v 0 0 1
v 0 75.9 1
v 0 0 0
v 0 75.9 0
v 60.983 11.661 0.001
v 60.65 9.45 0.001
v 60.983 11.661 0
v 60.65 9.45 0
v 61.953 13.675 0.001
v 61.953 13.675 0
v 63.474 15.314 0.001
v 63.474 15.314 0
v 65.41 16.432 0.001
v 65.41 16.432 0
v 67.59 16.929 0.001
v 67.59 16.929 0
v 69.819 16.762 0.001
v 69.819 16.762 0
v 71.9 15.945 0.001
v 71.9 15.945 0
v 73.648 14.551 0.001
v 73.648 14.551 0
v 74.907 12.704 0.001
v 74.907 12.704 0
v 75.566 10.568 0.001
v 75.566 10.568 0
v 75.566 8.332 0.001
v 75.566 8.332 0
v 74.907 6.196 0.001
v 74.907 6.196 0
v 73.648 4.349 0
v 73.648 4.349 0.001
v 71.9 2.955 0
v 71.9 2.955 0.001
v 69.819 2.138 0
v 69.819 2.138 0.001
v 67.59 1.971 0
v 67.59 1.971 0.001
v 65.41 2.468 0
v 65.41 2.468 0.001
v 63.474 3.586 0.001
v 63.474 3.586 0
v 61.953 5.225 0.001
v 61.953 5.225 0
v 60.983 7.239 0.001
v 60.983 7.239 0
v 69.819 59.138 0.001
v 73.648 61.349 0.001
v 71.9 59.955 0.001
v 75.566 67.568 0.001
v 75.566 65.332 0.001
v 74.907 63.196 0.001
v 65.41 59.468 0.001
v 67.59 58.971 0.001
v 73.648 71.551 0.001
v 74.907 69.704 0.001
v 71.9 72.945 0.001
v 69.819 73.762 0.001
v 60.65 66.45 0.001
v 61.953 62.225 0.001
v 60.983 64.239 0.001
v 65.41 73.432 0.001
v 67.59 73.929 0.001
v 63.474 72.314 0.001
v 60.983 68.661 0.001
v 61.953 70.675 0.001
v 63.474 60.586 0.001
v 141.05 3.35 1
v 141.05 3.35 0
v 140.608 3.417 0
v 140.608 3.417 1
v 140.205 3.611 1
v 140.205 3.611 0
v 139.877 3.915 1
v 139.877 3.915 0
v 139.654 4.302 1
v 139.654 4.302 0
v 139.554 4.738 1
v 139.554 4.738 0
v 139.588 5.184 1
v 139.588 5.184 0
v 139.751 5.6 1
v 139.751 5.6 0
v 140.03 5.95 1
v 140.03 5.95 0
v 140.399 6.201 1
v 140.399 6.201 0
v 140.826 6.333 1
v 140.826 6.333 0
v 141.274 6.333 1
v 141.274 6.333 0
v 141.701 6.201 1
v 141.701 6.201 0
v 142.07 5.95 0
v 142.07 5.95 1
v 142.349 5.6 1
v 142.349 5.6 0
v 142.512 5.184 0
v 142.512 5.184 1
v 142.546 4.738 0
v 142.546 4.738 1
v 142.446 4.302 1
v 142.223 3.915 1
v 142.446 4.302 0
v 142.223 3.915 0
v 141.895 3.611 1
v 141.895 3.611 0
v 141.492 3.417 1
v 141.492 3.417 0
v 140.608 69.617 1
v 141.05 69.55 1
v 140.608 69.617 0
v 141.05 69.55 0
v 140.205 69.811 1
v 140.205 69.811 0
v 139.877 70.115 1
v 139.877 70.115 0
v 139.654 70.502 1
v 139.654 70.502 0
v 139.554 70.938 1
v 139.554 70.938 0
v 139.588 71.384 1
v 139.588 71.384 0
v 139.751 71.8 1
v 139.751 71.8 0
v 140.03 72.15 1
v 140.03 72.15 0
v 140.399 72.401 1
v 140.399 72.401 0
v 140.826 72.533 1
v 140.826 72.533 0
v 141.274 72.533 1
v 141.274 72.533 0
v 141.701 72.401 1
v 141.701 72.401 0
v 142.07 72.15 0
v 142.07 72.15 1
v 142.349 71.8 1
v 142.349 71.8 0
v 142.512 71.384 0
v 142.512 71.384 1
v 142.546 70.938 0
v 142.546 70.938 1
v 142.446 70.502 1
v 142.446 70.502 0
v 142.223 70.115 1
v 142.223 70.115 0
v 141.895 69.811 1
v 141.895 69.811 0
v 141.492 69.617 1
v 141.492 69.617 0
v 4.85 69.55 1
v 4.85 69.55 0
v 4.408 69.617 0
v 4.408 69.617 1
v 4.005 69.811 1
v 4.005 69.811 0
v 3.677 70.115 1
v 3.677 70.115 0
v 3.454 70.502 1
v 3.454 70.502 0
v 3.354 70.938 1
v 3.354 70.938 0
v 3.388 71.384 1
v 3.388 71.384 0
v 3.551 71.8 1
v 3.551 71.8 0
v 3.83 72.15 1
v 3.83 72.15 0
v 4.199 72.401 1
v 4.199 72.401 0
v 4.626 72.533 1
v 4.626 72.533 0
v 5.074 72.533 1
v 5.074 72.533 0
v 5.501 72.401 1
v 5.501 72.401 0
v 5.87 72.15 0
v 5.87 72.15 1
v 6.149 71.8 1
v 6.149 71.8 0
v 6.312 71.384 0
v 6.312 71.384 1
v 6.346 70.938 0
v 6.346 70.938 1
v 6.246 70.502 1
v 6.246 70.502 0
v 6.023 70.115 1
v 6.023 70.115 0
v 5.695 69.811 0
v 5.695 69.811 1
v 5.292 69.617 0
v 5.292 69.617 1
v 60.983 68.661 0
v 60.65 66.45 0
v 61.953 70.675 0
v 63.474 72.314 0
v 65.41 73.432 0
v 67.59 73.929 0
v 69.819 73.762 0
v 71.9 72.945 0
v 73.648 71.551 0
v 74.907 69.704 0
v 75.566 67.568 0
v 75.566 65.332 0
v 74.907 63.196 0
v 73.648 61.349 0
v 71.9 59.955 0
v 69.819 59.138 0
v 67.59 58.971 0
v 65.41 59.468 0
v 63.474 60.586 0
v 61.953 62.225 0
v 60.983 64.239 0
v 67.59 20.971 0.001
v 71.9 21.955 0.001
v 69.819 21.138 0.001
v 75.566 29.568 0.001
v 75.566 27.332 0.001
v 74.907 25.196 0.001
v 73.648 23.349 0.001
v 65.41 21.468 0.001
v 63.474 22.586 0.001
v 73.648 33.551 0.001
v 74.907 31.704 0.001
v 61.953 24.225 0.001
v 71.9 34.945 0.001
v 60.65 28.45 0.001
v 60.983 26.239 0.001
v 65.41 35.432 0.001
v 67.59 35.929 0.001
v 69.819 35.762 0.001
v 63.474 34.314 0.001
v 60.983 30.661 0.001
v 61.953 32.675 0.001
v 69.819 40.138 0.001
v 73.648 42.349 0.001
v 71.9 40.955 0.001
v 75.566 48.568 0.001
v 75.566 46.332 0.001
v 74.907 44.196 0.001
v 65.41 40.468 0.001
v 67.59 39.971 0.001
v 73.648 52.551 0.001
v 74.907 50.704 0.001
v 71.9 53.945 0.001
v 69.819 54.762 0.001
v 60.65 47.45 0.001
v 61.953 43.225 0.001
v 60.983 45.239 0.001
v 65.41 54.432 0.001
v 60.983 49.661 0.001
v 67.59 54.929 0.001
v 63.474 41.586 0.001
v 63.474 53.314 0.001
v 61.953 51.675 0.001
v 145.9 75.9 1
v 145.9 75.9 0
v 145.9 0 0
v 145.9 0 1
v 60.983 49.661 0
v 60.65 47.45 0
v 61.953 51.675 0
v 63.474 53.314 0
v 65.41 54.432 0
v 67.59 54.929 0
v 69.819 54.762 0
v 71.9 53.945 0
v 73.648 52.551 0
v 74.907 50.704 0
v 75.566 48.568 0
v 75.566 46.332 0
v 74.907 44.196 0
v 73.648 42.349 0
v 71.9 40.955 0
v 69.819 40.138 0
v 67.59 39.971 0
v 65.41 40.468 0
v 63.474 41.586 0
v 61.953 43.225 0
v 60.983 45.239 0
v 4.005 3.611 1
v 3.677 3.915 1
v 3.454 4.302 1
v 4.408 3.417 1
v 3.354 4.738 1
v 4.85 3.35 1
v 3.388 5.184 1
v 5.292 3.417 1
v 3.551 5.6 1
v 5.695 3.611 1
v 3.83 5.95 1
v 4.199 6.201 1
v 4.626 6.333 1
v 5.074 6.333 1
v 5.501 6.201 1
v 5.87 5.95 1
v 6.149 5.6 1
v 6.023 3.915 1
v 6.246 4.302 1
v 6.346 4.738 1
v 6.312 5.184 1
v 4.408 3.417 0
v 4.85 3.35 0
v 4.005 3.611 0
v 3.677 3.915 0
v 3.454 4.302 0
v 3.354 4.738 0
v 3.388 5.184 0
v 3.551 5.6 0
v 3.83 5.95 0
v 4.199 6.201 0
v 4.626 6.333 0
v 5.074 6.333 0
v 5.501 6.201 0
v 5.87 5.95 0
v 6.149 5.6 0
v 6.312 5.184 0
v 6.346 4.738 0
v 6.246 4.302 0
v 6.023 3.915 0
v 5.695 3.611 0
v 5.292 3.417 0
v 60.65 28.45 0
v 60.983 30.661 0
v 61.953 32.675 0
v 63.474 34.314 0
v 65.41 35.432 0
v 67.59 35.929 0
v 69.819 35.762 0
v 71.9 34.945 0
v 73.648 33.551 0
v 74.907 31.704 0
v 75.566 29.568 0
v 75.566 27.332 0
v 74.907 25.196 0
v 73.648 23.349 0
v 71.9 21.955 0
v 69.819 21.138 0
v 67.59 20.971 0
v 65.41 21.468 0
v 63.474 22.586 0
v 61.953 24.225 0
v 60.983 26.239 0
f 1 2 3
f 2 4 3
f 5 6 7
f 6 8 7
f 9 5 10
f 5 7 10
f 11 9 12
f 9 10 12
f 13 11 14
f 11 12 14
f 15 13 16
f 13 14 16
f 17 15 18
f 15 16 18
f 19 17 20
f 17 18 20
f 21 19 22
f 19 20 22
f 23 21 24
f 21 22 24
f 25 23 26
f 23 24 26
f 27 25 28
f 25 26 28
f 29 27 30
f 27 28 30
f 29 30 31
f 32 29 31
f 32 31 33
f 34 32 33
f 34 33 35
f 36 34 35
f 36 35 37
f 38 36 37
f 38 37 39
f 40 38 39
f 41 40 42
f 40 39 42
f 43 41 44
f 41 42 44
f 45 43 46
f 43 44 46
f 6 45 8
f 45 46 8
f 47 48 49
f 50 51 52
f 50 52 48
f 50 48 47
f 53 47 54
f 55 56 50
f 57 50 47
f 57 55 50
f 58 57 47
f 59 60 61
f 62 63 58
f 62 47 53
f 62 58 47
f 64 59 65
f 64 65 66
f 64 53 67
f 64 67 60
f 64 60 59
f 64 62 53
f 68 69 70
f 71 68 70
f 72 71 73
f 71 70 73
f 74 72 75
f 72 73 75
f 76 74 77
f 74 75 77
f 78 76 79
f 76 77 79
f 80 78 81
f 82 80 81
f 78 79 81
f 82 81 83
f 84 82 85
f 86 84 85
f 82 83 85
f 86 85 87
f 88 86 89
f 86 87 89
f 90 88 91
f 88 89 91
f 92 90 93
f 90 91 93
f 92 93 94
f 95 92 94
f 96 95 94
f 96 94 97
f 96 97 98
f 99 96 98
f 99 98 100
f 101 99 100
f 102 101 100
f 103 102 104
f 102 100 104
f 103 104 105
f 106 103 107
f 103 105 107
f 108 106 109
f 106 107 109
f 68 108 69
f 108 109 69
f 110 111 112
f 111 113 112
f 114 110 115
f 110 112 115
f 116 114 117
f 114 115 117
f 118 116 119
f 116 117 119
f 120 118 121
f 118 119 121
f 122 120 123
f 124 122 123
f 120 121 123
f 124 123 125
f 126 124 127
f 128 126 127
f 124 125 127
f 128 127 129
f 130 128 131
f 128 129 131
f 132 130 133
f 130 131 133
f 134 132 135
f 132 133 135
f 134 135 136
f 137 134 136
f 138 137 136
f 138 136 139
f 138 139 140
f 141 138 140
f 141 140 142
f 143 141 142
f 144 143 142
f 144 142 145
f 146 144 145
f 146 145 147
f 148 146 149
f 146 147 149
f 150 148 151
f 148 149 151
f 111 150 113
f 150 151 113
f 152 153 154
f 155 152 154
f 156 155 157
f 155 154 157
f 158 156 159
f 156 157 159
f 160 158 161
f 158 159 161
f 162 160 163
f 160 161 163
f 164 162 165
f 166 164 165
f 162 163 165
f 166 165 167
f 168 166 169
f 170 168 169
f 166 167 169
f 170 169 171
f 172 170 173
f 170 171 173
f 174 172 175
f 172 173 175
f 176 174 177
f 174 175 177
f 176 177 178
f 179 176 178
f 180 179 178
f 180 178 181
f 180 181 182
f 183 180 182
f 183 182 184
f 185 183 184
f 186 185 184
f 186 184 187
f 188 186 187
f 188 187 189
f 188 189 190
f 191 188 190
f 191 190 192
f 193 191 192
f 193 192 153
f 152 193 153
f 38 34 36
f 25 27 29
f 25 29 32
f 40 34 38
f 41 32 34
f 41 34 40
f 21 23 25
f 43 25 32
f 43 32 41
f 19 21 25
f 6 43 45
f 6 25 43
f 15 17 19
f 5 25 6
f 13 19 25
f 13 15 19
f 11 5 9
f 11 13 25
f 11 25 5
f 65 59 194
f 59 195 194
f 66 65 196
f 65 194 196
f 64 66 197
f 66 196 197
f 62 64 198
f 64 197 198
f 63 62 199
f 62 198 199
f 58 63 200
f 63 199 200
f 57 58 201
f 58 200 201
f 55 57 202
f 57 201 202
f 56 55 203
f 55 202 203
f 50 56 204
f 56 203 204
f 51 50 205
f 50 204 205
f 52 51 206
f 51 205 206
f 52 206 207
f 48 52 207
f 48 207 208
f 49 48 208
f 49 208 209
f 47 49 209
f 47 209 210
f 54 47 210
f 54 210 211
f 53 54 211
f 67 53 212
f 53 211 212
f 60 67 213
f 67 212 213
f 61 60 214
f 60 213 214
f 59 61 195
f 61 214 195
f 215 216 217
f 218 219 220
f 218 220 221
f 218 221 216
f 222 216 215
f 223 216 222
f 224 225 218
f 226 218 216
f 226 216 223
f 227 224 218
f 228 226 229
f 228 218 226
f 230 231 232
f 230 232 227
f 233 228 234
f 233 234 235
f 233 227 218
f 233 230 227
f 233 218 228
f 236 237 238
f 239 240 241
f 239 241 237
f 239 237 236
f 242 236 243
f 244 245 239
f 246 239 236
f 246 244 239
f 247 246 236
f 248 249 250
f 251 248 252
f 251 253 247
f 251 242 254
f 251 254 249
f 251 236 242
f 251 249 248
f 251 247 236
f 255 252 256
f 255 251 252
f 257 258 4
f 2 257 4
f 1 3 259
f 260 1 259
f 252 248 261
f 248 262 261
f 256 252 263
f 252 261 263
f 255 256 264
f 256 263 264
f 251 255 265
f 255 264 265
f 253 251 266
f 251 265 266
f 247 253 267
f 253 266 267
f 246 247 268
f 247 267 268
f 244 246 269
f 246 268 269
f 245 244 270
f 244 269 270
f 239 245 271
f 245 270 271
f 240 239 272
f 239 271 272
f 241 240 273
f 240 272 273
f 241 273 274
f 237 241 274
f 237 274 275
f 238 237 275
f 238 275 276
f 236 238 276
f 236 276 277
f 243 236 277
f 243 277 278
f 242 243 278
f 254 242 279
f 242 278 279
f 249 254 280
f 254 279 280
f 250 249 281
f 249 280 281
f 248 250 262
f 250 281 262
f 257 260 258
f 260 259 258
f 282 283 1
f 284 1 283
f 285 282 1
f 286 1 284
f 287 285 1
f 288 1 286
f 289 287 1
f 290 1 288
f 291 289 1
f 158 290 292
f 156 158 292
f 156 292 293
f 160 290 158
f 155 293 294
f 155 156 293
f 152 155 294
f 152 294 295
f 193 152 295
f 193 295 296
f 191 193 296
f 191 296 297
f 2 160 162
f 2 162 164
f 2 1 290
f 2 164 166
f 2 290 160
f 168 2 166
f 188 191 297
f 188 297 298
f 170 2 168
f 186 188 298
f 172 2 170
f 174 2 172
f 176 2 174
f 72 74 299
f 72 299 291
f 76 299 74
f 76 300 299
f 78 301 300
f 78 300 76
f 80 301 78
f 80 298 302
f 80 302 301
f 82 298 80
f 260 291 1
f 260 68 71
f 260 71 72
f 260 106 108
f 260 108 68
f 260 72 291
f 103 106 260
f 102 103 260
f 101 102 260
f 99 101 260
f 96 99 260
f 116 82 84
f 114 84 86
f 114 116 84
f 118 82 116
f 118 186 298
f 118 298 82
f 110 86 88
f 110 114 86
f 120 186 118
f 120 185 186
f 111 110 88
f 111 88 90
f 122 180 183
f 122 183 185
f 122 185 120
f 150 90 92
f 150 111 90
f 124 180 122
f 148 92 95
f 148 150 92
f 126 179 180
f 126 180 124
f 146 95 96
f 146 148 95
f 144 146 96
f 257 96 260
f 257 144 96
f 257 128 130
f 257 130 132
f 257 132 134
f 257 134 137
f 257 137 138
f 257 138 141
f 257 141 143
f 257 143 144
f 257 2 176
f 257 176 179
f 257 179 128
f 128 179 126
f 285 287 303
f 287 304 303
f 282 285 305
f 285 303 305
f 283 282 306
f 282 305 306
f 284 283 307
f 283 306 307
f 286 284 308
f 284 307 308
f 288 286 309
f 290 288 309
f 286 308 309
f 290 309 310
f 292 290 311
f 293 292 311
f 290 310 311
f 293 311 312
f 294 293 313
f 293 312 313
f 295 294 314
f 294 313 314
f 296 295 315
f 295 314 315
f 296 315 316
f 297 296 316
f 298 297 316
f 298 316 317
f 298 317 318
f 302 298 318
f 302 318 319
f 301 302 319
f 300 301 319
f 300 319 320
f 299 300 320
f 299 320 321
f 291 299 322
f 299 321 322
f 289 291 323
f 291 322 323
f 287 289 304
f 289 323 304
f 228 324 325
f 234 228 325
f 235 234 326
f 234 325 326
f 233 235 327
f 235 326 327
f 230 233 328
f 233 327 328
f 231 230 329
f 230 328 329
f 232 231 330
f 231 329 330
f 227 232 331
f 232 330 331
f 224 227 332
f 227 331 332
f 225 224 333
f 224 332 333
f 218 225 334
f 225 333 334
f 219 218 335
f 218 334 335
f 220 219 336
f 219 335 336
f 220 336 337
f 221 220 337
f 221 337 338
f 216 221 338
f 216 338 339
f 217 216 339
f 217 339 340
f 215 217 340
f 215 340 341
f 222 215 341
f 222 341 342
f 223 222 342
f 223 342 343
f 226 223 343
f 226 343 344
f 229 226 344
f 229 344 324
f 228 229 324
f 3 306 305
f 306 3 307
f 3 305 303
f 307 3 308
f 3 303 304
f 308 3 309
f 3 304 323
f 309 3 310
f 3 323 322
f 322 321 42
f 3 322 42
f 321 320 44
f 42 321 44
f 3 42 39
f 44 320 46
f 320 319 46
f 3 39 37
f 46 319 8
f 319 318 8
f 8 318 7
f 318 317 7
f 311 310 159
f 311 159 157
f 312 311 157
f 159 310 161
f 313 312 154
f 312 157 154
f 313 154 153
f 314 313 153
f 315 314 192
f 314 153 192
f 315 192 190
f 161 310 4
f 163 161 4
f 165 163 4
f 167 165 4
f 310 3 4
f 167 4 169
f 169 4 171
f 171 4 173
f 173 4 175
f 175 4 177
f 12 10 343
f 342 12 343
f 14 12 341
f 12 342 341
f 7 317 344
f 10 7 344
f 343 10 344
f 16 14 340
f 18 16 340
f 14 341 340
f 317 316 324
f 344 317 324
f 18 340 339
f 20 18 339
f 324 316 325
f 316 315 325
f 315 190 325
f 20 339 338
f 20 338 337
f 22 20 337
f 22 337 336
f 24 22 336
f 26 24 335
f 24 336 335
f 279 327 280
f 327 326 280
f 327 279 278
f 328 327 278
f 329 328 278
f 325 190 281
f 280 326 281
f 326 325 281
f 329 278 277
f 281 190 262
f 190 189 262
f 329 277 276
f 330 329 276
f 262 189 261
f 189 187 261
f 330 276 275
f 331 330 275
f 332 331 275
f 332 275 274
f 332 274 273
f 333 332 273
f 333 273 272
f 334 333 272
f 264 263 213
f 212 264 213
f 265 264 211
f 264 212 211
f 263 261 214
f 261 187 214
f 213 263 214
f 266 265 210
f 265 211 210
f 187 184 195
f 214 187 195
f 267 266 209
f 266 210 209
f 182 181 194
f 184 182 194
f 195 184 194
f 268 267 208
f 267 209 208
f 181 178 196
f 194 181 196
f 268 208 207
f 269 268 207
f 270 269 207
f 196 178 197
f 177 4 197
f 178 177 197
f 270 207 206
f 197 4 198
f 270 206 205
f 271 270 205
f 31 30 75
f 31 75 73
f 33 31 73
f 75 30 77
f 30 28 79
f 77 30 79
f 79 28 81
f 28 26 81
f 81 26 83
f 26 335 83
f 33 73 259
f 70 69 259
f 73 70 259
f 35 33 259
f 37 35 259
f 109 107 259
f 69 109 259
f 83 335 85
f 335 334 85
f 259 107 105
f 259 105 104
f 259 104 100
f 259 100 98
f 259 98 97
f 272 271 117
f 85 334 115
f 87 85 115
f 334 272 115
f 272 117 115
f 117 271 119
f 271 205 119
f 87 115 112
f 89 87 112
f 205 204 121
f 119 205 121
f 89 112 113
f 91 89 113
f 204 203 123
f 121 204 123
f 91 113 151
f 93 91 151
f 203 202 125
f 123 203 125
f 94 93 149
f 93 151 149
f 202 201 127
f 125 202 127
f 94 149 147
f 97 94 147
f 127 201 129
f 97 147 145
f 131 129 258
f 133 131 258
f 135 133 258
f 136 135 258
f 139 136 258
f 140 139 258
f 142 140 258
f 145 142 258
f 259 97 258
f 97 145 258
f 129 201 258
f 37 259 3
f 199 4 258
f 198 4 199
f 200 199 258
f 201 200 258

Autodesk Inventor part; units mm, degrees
ref_plane "YZ Plane" through (0, 0, 0) normal (1, 0, 0) x (0, 1, 0)
ref_plane "XZ Plane" through (0, 0, 0) normal (0, 1, 0) x (-1, 0, 0)
ref_plane "XY Plane" through (0, 0, 0) normal (0, 0, 1) x (1, 0, 0)
sketch "Sketch1" plane through (0, 0, 0) normal (0, 0, 1) x (1, 0, 0)
  line L0 (0, 0) -> (145.9, 0)
  line L1 (145.9, 0) -> (145.9, 75.9)
  line L2 (145.9, 75.9) -> (0, 75.9)
  line L3 (0, 75.9) -> (0, 0)
  dimension "d0" = 145.9
  dimension "d1" = 75.9
extrude "Extrusion1" add sketch "Sketch1" along normal blind 1
sketch "Sketch2" plane through (0, 0, 1) normal (0, 0, 1) x (1, 0, 0)
  line L0 (145.9, 75.9) -> (0, 75.9) construction
  line L1 (0, 75.9) -> (0, 0) construction
  line L2 (0, 0) -> (145.9, 0) construction
  line L3 (145.9, 0) -> (145.9, 75.9) construction
  line L4 (145.9, 75.9) -> (0, 75.9) construction
  line L5 (0, 75.9) -> (0, 0) construction
  line L6 (141.05, 4.85) -> (4.85, 4.85) construction
  line L7 (4.85, 4.85) -> (4.85, 71.05) construction
  line L8 (4.85, 71.05) -> (141.05, 71.05) construction
  line L9 (141.05, 71.05) -> (141.05, 4.85) construction
  dimension "d4" = 4.85
hole "Hole1" at (4.85, 71.05, 1) at (4.85, 4.85, 1) at (141.05, 4.85, 1) at (141.05, 71.05, 1) direction (0, 0, -1) diameter 3 end through all
sketch "Sketch3" plane through (0, 0, 0) normal (0, 0, -1) x (-1, 0, 0)
  circle A0 centre (-141.05, 4.85) radius 1.5 construction
  circle A1 centre (-4.85, 71.05) radius 1.5 construction
  circle A2 centre (-4.85, 4.85) radius 1.5 construction
  circle A3 centre (-141.05, 71.05) radius 1.5 construction
  line L0 (0, 0) -> (-145.9, 0) construction
  line L1 (0, 75.9) -> (0, 0) construction
  line L2 (-145.9, 75.9) -> (0, 75.9) construction
  line L3 (-145.9, 0) -> (-145.9, 75.9) construction
  line L4 (-68.15, 0) -> (-68.15, 75.9) construction
  line L5 (0, 9.45) -> (-68.15, 9.45) construction
  line L6 (0, 28.45) -> (-68.15, 28.45) construction
  line L7 (0, 47.45) -> (-68.15, 47.45) construction
  line L8 (0, 66.45) -> (-68.15, 66.45) construction
  circle A4 centre (-68.15, 9.45) radius 7.5
  circle A5 centre (-68.15, 28.45) radius 7.5
  circle A6 centre (-68.15, 47.45) radius 7.5
  circle A7 centre (-68.15, 66.45) radius 7.5
  dimension "d20" = 68.15
  dimension "d21" = 9.45
  dimension "d23" = 19
  dimension "d24" = 19
  dimension "d25" = 19
  dimension "d26" = 15
  dimension "d27" = 15
  dimension "d28" = 15
  dimension "d29" = 15
extrude "Extrusion2" cut sketch "Sketch3" against normal blind 0.001
properties part number "Polycarbonate Facia" material "Polycarbonate, Clear"
